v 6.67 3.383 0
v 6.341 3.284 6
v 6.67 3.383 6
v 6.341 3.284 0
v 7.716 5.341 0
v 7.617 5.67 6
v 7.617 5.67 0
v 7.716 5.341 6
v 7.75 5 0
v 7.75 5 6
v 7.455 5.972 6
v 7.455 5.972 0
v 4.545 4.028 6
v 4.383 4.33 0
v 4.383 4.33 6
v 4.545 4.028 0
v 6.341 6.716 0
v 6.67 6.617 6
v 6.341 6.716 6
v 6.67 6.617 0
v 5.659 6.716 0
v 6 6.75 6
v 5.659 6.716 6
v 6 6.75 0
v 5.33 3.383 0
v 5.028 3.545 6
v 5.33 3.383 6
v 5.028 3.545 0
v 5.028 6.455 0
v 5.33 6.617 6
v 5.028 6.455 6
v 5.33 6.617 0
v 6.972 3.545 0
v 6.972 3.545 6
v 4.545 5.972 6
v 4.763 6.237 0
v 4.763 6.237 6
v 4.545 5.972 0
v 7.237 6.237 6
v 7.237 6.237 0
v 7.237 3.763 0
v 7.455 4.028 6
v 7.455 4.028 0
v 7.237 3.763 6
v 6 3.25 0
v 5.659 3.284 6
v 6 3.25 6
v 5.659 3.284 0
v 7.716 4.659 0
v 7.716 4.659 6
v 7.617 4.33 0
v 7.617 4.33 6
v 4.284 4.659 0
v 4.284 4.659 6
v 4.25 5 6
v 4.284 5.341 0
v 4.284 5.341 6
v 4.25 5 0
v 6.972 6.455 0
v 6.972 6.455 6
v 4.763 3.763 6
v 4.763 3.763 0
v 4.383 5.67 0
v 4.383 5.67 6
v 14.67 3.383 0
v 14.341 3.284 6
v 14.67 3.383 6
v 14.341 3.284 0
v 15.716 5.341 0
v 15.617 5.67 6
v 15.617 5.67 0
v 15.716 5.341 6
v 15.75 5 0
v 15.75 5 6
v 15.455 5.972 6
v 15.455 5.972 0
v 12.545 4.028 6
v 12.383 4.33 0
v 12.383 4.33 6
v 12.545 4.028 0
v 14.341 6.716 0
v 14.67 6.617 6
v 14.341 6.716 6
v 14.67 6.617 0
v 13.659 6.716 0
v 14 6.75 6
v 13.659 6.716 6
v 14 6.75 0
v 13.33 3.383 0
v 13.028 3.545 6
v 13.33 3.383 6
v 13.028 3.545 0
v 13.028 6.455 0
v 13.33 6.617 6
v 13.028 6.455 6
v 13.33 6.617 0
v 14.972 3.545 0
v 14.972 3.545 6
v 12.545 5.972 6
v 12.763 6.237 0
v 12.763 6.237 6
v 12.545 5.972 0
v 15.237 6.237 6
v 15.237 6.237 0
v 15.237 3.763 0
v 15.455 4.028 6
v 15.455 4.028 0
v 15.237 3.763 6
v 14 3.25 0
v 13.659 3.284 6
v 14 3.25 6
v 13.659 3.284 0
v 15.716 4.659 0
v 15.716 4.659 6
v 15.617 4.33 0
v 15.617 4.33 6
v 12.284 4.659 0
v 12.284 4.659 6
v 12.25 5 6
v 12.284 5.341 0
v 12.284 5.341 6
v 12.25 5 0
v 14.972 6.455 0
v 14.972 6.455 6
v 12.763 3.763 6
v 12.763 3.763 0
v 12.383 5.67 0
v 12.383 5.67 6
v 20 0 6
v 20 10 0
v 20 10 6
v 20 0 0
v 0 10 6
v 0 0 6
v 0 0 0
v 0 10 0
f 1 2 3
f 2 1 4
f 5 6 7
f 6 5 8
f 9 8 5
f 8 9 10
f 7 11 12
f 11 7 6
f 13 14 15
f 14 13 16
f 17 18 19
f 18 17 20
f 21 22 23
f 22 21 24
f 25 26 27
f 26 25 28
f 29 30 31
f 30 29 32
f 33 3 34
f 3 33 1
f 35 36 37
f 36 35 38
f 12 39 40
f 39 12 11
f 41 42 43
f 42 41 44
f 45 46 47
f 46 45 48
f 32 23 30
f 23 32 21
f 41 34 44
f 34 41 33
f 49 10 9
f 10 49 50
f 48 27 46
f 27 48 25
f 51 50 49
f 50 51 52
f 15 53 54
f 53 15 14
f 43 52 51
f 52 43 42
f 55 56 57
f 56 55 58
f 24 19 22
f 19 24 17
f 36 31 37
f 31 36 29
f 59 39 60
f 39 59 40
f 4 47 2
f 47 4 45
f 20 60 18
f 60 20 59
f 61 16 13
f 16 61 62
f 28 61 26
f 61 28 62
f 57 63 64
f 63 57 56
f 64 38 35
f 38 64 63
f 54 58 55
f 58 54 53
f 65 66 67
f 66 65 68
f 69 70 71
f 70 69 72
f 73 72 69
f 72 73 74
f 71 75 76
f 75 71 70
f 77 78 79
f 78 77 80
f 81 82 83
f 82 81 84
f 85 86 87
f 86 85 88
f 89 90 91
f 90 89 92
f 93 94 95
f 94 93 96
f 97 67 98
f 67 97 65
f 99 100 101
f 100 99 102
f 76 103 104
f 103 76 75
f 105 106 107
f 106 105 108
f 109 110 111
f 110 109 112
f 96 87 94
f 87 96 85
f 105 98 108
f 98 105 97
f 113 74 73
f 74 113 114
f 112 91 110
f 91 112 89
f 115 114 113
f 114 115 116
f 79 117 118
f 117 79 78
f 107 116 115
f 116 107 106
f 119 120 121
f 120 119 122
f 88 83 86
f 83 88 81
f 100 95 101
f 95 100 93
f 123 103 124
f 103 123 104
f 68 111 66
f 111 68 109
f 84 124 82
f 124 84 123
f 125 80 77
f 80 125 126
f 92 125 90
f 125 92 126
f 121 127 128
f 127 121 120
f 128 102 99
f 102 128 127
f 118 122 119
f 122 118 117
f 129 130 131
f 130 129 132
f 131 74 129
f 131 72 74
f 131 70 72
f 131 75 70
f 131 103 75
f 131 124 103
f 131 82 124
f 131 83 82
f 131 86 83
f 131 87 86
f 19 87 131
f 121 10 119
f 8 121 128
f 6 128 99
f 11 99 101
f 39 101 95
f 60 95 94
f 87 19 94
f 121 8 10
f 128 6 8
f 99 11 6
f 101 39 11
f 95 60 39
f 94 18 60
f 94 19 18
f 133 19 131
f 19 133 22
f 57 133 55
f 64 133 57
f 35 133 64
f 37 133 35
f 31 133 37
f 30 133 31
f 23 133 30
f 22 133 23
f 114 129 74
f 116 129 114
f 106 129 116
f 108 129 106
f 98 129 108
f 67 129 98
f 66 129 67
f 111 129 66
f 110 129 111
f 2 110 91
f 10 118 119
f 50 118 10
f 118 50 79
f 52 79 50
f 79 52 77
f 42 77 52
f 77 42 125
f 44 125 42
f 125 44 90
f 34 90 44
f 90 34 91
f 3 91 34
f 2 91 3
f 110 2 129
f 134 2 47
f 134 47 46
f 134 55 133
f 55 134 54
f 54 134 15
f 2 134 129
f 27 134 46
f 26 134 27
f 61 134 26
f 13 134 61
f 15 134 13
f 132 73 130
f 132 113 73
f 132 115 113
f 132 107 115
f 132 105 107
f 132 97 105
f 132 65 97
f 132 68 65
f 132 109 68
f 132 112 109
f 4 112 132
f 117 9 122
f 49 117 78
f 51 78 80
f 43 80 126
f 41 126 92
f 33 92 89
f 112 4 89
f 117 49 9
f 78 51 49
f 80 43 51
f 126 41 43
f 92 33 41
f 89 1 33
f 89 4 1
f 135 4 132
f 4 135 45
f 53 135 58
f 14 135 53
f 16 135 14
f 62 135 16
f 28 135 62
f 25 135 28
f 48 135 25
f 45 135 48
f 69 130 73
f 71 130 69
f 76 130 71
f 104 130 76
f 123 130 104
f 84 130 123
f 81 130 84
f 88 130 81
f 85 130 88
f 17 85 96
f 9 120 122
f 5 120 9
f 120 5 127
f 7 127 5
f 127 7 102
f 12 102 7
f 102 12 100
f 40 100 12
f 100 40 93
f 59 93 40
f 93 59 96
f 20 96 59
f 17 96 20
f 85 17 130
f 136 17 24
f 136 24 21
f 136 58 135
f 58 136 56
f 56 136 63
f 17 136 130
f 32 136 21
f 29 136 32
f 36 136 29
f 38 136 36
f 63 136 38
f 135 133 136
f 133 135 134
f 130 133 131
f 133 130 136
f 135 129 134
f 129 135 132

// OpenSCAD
$fn = 32;

// ----------------------------------------------------------------------
// Micro pad: two-hole pad, 5-20 mm class
// ----------------------------------------------------------------------

// --- parameters (mm) ---
pad_l = 20;               // pad length, X
pad_w = 10;               // pad width, Y
pad_t = 6;                // pad thickness, Z
hole_d = 3.5;             // hole diameter
hole_x = 6;               // X of the first hole centre

difference() {
  cube([pad_l, pad_w, pad_t]);
  for (x = [hole_x, pad_l - hole_x])
    translate([x, pad_w / 2, -1])
      cylinder(h = pad_t + 2, d = hole_d);
}
